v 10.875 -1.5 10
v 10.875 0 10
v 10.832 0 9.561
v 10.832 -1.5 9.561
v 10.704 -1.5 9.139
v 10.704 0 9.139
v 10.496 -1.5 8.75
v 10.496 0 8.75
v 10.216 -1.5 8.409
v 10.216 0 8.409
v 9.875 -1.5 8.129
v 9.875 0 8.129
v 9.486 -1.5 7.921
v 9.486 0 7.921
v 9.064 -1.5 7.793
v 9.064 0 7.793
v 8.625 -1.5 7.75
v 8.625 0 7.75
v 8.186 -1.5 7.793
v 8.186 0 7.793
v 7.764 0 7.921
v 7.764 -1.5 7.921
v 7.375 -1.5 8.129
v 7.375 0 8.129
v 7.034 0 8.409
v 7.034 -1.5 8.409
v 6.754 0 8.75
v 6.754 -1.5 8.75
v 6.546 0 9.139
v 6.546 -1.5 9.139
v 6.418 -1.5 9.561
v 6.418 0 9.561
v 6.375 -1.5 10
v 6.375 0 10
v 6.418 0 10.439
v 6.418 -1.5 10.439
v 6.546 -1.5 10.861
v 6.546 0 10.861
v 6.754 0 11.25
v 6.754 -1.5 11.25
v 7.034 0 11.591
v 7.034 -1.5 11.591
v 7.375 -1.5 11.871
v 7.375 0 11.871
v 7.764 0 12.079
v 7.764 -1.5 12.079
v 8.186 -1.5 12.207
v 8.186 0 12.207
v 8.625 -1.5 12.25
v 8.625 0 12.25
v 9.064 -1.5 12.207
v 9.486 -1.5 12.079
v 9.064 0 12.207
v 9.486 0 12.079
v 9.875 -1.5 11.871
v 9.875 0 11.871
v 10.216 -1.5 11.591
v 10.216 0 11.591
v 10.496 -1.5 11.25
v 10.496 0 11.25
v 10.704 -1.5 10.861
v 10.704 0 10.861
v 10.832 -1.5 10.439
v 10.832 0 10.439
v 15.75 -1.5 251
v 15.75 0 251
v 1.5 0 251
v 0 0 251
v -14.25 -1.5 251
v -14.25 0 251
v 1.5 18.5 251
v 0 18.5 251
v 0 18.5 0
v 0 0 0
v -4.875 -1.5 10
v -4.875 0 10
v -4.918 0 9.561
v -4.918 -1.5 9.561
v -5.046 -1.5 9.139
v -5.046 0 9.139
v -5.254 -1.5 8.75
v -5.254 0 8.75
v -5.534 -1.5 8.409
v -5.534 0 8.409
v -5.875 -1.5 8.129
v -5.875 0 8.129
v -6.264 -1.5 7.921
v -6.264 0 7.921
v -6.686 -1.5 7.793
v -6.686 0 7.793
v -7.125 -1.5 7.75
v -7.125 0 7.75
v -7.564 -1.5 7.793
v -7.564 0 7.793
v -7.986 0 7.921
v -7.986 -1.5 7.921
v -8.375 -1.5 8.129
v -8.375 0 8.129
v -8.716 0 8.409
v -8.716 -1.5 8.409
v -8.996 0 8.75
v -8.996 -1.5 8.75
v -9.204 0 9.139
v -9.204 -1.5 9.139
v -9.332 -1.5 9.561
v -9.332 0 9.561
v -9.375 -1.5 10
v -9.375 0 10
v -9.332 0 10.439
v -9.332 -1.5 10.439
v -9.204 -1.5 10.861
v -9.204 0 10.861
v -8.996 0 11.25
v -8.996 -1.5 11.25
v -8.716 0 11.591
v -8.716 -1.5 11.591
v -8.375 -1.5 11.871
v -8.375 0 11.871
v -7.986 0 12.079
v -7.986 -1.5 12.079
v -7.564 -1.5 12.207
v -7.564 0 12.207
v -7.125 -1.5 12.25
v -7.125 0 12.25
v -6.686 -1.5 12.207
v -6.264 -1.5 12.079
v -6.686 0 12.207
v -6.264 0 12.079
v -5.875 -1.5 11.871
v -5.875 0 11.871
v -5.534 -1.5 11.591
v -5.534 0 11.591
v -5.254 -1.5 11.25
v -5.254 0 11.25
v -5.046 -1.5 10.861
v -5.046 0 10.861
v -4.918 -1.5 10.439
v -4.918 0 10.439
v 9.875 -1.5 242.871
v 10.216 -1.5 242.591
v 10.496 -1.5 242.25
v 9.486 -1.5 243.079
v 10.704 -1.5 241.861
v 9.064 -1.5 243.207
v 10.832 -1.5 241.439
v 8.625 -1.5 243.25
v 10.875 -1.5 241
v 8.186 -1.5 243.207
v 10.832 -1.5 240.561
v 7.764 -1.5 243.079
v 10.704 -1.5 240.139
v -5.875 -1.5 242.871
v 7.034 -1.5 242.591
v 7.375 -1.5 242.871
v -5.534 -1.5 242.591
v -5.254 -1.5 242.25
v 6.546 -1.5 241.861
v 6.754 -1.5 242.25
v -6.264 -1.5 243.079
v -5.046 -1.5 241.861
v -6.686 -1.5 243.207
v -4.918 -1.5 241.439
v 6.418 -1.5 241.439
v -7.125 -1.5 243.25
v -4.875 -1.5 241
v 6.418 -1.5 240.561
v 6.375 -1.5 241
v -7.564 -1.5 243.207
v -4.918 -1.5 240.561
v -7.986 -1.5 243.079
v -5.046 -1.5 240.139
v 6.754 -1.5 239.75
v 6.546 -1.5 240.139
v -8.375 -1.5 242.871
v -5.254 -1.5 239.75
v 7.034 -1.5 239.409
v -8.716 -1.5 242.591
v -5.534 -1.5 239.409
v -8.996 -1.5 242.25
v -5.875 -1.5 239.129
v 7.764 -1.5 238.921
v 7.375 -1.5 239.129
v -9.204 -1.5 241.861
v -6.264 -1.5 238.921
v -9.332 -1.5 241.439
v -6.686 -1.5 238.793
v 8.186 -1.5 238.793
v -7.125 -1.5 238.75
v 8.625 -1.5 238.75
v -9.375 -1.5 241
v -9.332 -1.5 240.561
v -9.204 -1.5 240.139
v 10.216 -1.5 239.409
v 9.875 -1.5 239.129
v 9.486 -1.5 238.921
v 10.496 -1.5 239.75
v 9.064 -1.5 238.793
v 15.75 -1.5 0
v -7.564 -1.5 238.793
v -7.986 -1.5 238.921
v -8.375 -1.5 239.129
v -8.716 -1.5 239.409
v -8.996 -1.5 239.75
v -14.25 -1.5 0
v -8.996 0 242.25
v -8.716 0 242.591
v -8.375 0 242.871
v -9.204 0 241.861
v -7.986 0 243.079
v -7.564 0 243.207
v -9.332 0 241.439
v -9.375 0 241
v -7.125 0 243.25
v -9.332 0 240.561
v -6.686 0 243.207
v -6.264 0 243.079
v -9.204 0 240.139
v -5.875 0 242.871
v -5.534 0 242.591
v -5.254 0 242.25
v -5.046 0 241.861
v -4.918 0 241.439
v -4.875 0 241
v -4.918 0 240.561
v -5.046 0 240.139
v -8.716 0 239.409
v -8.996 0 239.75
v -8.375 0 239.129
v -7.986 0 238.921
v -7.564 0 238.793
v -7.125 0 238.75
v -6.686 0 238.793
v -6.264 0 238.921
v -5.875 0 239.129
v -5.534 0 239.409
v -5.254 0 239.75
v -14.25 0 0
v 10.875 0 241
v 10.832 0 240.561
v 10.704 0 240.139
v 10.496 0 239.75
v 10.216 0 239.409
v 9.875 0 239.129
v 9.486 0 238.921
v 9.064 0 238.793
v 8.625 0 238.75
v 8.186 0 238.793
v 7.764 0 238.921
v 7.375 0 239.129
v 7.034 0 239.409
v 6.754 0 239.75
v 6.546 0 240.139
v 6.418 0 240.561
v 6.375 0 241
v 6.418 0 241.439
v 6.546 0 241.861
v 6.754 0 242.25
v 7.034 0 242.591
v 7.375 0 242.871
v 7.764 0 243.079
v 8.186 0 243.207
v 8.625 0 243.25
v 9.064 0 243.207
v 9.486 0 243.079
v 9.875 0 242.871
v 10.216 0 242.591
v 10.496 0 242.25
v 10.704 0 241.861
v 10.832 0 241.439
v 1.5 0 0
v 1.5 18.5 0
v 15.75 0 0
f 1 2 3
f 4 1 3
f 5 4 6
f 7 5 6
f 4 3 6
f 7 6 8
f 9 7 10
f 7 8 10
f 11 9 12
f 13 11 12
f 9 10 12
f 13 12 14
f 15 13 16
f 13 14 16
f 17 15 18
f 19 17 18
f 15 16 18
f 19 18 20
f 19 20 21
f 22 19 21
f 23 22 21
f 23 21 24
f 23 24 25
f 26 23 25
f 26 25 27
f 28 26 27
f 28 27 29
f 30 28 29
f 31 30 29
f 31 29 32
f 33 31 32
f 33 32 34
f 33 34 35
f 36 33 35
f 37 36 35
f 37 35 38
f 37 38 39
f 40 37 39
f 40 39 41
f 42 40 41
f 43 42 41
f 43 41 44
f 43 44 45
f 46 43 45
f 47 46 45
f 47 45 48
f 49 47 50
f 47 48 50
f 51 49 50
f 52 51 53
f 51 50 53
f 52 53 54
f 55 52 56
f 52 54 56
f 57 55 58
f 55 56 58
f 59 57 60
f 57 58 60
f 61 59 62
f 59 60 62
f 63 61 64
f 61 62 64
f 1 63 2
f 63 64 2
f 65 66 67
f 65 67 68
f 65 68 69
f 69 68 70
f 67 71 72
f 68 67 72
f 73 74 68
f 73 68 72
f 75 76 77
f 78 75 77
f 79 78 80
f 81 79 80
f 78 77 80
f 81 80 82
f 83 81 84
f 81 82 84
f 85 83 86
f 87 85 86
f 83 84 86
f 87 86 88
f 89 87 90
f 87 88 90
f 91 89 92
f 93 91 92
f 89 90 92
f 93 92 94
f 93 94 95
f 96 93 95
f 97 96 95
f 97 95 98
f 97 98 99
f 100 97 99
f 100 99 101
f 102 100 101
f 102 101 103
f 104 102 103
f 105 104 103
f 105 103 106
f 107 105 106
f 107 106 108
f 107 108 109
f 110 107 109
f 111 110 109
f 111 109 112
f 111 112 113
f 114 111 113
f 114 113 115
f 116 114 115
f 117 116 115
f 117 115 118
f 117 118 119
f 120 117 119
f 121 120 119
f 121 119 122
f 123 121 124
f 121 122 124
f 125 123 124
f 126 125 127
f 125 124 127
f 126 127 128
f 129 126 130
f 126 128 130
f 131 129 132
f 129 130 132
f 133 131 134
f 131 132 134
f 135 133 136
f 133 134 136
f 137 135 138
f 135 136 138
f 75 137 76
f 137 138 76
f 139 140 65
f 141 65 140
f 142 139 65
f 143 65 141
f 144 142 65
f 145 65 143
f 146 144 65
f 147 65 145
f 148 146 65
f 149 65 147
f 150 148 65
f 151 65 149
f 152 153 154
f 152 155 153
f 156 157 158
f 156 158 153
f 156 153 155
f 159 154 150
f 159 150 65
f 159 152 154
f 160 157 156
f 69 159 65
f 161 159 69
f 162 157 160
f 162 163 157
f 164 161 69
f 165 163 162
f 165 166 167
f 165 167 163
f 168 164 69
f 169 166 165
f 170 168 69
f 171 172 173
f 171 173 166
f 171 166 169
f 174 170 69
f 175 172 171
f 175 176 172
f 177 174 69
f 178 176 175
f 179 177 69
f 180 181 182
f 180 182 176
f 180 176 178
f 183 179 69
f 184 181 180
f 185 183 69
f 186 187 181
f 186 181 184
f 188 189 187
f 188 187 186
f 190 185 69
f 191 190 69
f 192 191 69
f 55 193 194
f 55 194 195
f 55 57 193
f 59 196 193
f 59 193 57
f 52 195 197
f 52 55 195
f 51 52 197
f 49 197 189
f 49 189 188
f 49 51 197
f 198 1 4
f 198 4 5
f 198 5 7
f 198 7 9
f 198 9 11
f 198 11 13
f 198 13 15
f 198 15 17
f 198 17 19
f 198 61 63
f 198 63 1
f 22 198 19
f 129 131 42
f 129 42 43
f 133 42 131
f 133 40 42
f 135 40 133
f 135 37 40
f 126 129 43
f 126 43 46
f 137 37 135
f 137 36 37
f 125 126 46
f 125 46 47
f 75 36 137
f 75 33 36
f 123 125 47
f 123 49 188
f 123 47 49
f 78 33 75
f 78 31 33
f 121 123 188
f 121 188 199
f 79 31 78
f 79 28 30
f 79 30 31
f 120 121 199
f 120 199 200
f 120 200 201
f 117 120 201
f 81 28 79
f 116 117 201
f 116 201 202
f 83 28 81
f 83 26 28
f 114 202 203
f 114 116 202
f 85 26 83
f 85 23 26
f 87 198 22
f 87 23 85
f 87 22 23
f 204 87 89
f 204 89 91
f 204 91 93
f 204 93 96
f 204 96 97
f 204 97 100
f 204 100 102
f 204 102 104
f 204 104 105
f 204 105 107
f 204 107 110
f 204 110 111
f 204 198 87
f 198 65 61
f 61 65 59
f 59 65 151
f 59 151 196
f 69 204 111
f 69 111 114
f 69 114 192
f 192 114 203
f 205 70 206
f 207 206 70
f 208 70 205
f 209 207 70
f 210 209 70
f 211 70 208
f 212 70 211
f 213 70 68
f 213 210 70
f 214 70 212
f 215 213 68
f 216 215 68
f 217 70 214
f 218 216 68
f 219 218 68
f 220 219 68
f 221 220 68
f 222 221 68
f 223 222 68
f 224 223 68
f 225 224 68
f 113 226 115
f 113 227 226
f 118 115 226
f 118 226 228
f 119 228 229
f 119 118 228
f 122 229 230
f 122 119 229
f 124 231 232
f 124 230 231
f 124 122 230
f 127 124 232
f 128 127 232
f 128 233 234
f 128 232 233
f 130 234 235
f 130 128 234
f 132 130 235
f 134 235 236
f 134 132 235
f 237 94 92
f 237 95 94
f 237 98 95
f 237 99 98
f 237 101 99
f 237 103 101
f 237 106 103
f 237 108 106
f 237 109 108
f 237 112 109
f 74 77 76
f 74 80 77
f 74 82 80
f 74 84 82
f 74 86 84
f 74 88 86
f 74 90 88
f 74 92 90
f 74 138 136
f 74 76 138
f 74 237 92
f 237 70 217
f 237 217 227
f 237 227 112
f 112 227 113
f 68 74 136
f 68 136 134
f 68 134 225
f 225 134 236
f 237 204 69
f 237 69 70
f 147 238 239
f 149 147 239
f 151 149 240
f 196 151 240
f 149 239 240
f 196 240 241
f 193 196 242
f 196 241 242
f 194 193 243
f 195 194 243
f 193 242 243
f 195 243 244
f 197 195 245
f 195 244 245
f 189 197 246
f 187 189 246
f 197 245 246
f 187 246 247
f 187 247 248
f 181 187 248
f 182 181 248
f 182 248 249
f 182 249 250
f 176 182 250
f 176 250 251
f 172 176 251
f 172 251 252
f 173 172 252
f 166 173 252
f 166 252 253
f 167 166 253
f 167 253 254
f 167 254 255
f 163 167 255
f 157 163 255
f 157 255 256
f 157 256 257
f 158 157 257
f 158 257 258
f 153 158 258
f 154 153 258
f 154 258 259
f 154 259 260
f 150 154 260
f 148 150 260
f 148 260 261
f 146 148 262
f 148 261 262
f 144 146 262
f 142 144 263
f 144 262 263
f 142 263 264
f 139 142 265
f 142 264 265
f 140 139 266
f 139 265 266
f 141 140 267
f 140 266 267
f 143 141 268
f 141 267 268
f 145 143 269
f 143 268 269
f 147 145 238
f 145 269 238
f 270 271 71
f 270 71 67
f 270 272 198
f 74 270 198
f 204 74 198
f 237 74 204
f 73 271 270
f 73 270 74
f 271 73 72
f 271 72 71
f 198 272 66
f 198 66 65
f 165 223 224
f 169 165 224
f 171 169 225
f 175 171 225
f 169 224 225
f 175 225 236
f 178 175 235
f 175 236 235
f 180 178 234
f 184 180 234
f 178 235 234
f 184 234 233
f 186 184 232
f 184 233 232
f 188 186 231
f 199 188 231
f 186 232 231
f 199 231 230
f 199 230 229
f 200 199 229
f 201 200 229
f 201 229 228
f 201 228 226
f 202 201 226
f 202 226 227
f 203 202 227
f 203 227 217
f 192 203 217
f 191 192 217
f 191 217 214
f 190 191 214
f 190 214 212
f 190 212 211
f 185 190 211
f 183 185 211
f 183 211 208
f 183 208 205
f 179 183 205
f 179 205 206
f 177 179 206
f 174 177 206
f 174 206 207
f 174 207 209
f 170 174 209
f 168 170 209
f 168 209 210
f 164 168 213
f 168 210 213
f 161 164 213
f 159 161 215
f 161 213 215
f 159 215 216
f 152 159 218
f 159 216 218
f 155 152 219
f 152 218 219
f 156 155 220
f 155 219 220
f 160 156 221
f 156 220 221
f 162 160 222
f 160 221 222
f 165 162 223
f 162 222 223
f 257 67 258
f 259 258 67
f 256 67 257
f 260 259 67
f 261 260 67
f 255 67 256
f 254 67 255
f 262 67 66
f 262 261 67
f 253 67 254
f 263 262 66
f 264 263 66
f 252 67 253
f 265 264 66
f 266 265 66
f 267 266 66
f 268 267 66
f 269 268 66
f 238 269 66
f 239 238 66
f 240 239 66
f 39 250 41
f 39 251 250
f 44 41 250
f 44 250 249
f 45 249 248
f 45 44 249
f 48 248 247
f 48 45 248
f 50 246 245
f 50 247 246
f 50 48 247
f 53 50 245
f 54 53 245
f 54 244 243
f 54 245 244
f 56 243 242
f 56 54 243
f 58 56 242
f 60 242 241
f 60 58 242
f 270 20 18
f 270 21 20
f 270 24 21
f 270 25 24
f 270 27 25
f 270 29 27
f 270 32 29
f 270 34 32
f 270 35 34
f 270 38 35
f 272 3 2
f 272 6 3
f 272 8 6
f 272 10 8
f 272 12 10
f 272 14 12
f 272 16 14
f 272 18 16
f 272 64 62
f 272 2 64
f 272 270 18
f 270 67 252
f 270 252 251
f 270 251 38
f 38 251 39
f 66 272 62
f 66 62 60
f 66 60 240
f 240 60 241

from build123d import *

# Parameters (mm, degrees)
EXTRUDE_1_DEPTH     = 251
SKETCH_2_R          = 2.25
CUT_EXTRUDE_1_DEPTH = 2.5


with BuildPart() as part:
    # Эскиз1 → Бобышка-Вытянуть1 (new body)
    with BuildSketch(Plane.XY):
        Polygon((0, 0), (0, 18.5), (1.5, 18.5), (1.5, 0), (15.75, 0), (15.75, -1.5), (-14.25, -1.5), (-14.25, 0), align=None)
    extrude(amount=EXTRUDE_1_DEPTH)

    # Эскиз2 → Вырез-Вытянуть1 (cut, through all)
    with BuildSketch(Plane(origin=(0, 0, 0), x_dir=(1, 0, 0), z_dir=(0, 1, 0))):
        with Locations((-7.125, -10)):
            Circle(SKETCH_2_R)
        with Locations((8.625, -10)):
            Circle(SKETCH_2_R)
        with Locations((-7.125, -241)):
            Circle(SKETCH_2_R)
        with Locations((8.625, -241)):
            Circle(SKETCH_2_R)
    extrude(amount=-CUT_EXTRUDE_1_DEPTH, mode=Mode.SUBTRACT)


solid = part.part
